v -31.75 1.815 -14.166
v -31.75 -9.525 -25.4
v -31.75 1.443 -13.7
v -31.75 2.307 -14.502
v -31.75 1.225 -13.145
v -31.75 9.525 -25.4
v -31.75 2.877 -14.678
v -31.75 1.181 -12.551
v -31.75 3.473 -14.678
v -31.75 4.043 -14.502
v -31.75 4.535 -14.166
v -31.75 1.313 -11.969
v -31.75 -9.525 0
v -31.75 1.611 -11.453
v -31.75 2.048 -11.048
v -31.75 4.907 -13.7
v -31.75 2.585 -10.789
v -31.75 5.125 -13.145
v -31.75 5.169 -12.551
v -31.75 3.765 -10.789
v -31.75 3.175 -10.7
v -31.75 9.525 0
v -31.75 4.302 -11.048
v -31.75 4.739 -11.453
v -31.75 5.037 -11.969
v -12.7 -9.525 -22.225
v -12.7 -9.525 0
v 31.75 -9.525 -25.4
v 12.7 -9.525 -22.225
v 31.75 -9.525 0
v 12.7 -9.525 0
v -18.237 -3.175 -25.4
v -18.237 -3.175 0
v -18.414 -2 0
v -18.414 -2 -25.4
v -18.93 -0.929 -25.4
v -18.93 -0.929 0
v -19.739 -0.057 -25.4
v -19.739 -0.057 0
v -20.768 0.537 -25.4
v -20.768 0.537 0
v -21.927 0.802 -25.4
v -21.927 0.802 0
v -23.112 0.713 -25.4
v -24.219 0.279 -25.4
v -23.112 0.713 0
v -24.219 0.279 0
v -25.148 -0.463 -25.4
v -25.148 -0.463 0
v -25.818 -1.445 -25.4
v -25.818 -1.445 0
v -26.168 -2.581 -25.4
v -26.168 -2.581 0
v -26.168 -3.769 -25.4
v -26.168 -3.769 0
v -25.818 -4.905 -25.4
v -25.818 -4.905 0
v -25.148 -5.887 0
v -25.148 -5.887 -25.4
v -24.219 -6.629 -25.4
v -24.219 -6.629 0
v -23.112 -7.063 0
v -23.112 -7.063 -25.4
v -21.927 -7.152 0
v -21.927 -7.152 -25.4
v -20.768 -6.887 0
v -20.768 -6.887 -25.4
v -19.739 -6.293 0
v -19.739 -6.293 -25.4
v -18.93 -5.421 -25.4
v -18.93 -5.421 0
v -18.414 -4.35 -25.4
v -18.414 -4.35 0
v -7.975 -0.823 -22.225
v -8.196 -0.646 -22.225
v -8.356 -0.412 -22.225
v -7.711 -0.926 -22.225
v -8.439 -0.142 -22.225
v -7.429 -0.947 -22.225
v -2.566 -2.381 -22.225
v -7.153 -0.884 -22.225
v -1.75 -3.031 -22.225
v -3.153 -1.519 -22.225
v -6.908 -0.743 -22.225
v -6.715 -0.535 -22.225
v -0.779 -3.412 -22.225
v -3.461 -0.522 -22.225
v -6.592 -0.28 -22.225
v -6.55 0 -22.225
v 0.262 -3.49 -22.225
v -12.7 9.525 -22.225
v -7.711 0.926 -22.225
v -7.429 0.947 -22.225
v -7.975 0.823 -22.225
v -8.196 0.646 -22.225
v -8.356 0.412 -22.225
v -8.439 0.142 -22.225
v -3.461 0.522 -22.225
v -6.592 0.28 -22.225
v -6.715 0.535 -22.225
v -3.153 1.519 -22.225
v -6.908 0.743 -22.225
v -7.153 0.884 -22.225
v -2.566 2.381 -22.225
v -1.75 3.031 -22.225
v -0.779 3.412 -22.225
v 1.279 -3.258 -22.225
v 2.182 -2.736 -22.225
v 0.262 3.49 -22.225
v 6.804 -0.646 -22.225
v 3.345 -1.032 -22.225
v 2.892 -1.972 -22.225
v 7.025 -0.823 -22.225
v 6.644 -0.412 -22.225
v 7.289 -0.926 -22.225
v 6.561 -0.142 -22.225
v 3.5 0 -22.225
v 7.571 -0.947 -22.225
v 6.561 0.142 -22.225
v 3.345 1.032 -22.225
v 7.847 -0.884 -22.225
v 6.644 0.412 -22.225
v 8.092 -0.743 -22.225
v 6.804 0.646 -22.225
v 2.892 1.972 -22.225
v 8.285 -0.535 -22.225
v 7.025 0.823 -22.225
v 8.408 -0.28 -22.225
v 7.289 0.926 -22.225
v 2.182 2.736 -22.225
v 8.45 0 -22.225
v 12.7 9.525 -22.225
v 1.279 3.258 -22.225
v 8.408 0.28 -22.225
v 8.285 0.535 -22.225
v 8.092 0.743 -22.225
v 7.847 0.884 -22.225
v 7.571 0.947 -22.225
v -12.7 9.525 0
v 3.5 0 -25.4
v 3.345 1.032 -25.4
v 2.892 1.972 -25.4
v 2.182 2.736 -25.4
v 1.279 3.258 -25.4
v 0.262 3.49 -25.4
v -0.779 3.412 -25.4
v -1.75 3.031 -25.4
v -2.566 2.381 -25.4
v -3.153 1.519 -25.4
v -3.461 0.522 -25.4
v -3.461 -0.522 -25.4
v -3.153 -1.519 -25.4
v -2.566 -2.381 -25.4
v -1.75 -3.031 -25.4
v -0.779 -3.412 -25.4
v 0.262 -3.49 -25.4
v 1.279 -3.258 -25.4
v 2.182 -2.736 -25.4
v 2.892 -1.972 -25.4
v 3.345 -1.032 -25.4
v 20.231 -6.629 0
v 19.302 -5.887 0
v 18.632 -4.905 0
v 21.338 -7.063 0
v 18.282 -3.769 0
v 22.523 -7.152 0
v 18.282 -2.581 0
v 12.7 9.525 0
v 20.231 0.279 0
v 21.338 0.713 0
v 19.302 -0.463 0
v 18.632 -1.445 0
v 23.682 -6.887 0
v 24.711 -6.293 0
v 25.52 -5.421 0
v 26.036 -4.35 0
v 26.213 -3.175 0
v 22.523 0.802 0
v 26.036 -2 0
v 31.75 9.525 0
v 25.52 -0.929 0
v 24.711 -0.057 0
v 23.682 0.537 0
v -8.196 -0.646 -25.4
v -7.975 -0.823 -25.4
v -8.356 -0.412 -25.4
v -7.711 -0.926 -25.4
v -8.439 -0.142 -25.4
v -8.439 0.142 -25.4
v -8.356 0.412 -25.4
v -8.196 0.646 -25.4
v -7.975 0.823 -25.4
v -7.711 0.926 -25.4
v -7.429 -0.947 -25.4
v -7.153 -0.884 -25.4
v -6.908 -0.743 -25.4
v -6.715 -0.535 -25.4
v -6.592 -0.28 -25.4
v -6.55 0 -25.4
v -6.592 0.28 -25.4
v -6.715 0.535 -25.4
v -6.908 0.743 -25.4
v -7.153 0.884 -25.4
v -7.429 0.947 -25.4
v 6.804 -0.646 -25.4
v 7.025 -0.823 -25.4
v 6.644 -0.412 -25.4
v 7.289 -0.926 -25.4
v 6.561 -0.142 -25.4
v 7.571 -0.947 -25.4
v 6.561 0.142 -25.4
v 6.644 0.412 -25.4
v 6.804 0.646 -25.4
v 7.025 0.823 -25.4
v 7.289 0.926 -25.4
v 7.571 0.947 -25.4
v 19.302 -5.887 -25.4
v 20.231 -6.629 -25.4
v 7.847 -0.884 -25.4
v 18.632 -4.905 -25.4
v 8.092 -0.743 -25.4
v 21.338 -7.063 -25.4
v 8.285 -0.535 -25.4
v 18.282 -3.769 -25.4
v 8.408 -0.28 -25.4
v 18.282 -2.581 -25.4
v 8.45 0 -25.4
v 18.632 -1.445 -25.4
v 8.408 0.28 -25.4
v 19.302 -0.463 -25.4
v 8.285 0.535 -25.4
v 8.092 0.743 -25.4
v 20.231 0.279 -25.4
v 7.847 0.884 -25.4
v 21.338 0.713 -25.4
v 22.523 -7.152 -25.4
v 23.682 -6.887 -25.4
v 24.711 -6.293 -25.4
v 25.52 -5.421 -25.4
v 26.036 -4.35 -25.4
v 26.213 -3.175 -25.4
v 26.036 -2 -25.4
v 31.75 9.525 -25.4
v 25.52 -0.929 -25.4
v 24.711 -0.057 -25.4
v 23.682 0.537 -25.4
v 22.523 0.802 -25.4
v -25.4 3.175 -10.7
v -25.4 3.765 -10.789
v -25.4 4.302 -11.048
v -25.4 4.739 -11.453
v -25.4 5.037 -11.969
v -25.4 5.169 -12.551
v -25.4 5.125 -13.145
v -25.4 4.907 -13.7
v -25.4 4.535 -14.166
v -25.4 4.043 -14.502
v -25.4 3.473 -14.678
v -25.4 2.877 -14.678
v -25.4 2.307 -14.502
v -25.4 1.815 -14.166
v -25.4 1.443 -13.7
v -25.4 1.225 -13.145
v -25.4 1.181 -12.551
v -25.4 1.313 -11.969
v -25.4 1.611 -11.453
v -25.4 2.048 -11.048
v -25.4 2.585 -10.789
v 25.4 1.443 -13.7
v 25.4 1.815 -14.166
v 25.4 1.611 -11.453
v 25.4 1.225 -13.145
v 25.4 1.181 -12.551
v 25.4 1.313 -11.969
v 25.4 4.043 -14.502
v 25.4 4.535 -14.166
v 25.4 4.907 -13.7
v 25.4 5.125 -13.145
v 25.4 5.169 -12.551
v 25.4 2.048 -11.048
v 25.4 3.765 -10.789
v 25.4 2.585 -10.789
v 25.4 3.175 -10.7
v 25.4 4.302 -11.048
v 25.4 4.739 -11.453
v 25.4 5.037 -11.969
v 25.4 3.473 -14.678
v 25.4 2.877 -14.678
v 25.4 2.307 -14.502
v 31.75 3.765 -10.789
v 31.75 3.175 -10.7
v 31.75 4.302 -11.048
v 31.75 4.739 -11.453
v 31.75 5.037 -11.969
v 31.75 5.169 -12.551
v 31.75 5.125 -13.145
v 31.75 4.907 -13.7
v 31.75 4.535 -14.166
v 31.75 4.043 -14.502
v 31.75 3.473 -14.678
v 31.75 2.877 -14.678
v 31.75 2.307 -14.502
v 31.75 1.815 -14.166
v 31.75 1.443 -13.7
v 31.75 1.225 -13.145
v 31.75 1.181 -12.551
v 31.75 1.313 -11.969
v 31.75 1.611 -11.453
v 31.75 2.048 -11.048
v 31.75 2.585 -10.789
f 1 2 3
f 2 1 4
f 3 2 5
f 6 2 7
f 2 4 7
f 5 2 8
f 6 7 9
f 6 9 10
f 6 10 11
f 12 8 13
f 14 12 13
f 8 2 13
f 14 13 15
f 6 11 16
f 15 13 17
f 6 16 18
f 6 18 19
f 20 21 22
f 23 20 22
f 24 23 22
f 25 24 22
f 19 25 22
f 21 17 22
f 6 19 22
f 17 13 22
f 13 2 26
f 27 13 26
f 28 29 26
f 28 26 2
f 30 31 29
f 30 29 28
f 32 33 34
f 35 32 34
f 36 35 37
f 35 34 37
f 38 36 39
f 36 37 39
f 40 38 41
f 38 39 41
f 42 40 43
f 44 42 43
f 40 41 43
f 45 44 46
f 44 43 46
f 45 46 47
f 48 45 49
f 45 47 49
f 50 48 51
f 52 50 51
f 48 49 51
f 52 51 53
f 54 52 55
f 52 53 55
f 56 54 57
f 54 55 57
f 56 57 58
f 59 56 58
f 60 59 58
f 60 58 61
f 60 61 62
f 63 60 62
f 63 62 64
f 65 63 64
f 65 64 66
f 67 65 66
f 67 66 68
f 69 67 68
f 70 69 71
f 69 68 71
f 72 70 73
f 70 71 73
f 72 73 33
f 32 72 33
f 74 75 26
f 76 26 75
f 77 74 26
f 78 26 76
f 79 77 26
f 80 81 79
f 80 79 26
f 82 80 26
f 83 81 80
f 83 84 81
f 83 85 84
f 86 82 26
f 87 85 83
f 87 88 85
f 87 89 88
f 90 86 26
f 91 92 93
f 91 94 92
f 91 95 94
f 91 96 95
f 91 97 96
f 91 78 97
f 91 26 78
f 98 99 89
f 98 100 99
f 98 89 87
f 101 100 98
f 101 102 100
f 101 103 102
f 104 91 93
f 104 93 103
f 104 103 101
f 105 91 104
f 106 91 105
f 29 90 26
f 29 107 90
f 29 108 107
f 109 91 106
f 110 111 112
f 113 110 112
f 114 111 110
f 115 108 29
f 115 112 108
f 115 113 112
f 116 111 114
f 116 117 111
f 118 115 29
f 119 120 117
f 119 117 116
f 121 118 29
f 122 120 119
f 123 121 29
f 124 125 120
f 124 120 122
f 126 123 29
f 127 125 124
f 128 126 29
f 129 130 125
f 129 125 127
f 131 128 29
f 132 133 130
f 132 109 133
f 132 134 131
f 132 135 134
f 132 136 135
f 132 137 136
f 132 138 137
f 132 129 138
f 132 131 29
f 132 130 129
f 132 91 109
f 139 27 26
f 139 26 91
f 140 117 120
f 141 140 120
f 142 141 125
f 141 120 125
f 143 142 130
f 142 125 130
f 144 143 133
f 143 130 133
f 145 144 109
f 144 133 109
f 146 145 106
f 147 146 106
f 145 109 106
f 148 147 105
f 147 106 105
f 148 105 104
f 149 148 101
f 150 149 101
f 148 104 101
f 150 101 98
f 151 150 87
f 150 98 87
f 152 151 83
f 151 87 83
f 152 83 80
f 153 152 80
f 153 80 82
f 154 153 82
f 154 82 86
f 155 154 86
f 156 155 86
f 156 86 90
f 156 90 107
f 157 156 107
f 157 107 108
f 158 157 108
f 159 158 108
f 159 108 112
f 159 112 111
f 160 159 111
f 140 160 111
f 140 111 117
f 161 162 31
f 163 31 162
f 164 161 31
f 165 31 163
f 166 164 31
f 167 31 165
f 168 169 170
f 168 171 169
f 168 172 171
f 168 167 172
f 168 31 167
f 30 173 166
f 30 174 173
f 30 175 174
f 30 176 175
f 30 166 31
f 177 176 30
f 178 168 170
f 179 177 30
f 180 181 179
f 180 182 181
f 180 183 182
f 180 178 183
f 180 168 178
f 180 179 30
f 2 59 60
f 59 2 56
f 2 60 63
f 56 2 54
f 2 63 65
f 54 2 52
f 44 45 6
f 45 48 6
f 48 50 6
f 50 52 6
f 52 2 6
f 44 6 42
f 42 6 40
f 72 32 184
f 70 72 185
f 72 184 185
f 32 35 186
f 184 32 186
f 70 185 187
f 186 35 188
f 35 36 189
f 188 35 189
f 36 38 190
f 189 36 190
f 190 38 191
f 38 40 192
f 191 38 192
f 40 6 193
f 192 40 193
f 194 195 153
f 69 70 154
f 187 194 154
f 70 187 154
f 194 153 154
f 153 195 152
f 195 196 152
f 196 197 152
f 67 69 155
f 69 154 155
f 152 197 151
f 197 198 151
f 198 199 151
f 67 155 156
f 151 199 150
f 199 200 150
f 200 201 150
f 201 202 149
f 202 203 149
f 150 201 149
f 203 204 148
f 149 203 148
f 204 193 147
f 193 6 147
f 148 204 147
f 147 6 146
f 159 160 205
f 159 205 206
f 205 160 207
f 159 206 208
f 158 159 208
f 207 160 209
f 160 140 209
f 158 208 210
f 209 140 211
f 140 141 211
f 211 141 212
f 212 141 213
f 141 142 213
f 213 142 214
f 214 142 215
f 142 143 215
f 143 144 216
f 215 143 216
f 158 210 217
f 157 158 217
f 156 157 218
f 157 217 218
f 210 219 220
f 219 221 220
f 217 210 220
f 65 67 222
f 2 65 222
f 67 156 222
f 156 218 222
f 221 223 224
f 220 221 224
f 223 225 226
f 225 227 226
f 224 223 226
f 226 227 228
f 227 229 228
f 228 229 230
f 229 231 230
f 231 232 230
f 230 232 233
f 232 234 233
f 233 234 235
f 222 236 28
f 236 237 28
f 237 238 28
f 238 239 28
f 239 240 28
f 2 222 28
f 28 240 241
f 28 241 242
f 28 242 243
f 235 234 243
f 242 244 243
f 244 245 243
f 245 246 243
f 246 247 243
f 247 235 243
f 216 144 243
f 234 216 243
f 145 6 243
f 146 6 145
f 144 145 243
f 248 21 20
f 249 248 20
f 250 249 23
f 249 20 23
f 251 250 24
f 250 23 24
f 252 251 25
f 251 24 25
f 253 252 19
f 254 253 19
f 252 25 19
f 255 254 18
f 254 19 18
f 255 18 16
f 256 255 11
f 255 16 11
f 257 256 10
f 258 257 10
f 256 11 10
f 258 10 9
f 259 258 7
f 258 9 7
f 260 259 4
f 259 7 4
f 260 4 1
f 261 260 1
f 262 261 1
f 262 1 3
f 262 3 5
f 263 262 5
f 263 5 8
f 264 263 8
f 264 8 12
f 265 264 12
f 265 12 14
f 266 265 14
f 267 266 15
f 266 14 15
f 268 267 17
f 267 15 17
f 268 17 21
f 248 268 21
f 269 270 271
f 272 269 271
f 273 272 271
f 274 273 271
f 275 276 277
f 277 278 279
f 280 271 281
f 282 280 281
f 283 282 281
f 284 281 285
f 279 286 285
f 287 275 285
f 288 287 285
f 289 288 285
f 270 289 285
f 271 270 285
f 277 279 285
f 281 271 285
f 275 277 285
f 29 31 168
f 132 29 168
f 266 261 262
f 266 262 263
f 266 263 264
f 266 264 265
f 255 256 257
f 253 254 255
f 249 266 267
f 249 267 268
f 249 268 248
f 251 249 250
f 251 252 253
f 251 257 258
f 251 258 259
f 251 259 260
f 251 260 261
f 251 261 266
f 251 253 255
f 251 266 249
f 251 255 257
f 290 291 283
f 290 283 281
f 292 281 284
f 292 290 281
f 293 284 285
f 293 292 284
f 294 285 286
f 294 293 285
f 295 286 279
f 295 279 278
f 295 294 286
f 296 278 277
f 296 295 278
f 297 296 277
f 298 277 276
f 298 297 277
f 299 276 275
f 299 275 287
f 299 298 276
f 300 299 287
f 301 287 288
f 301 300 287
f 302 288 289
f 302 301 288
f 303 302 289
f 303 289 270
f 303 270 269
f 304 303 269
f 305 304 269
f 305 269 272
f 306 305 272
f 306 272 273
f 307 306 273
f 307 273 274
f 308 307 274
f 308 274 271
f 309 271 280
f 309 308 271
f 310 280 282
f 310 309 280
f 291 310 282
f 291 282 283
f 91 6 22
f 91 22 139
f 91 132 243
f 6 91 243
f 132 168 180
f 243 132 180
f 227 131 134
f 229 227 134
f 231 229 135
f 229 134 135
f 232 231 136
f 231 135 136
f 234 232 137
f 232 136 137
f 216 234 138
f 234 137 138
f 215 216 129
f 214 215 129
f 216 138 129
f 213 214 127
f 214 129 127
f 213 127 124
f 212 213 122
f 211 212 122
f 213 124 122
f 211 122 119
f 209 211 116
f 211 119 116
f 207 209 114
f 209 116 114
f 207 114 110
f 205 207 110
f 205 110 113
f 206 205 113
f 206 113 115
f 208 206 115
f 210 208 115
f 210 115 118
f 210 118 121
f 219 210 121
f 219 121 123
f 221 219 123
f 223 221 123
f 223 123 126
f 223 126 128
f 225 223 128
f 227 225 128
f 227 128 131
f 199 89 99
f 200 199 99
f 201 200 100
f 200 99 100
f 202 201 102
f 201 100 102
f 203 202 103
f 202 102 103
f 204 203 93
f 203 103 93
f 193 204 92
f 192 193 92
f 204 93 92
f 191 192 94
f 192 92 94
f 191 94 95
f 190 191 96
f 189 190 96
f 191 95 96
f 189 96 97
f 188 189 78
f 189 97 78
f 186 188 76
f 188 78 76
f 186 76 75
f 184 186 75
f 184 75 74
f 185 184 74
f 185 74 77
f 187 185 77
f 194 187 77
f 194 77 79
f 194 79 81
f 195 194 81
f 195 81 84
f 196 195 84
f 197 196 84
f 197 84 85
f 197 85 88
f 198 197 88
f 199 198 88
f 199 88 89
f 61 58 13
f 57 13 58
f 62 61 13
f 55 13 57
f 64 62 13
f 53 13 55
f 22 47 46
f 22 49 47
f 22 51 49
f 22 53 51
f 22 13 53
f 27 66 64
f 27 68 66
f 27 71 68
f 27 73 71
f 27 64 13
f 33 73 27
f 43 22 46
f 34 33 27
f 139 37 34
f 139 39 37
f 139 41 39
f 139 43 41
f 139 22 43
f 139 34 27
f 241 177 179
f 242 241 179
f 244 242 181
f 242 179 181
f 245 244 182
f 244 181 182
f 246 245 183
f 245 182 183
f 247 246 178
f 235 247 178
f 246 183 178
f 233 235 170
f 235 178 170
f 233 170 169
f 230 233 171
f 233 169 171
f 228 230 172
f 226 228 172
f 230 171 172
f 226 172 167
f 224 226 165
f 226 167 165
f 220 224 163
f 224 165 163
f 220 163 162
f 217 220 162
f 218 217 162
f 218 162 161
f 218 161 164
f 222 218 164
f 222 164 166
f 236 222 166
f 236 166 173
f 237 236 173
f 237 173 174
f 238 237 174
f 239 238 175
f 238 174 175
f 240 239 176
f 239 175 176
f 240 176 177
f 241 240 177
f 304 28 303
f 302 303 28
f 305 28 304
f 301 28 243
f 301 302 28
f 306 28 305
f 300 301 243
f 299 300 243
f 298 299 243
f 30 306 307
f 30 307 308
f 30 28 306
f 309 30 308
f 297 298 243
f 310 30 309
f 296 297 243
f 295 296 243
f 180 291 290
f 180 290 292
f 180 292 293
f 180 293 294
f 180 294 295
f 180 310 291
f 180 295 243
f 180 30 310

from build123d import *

# Parameters (mm, degrees)
SKETCH1_W           = 63.5
SKETCH1_H           = 19.05
SKETCH1_R           = 3.9878
BOSS_EXTRUDE1_DEPTH = 25.4
SKETCH2_R           = 2
CUT_EXTRUDE1_DEPTH  = 6.35
SKETCH3_W           = 25.4
SKETCH3_H           = 19.05
CUT_EXTRUDE2_DEPTH  = 22.225
SKETCH6_R           = 0.95
SKETCH6_R_2         = 3.5
CUT_EXTRUDE3_DEPTH  = 4.175


with BuildPart() as part:
    # Sketch1 → Boss-Extrude1 (new body)
    with BuildSketch(Plane.XY):
        Rectangle(SKETCH1_W, SKETCH1_H)
        with Locations((-22.225, -3.175)):
            Circle(SKETCH1_R, mode=Mode.SUBTRACT)
        with Locations((22.225, -3.175)):
            Circle(SKETCH1_R, mode=Mode.SUBTRACT)
    extrude(amount=-BOSS_EXTRUDE1_DEPTH)

    # Sketch2 → Cut-Extrude1 (cut)
    with BuildSketch(Plane.ZY.offset(31.75)):
        with Locations((-12.7, 3.175)):
            Circle(SKETCH2_R)
    cut_extrude1 = extrude(amount=-CUT_EXTRUDE1_DEPTH, mode=Mode.SUBTRACT)

    # Mirror1: Cut-Extrude1 across plane
    add(cut_extrude1.mirror(Plane.ZY), mode=Mode.SUBTRACT)

    # Sketch3 → Cut-Extrude2 (cut)
    with BuildSketch(Plane.XY):
        Rectangle(SKETCH3_W, SKETCH3_H)
    extrude(amount=-CUT_EXTRUDE2_DEPTH, mode=Mode.SUBTRACT)

    # Sketch6 → Cut-Extrude3 (cut, through all)
    with BuildSketch(Plane.XY.offset(-22.225)):
        with Locations((-7.5, 0)):
            Circle(SKETCH6_R)
        with Locations((7.5, 0)):
            Circle(SKETCH6_R)
        Circle(SKETCH6_R_2)
    extrude(amount=-CUT_EXTRUDE3_DEPTH, mode=Mode.SUBTRACT)


solid = part.part
